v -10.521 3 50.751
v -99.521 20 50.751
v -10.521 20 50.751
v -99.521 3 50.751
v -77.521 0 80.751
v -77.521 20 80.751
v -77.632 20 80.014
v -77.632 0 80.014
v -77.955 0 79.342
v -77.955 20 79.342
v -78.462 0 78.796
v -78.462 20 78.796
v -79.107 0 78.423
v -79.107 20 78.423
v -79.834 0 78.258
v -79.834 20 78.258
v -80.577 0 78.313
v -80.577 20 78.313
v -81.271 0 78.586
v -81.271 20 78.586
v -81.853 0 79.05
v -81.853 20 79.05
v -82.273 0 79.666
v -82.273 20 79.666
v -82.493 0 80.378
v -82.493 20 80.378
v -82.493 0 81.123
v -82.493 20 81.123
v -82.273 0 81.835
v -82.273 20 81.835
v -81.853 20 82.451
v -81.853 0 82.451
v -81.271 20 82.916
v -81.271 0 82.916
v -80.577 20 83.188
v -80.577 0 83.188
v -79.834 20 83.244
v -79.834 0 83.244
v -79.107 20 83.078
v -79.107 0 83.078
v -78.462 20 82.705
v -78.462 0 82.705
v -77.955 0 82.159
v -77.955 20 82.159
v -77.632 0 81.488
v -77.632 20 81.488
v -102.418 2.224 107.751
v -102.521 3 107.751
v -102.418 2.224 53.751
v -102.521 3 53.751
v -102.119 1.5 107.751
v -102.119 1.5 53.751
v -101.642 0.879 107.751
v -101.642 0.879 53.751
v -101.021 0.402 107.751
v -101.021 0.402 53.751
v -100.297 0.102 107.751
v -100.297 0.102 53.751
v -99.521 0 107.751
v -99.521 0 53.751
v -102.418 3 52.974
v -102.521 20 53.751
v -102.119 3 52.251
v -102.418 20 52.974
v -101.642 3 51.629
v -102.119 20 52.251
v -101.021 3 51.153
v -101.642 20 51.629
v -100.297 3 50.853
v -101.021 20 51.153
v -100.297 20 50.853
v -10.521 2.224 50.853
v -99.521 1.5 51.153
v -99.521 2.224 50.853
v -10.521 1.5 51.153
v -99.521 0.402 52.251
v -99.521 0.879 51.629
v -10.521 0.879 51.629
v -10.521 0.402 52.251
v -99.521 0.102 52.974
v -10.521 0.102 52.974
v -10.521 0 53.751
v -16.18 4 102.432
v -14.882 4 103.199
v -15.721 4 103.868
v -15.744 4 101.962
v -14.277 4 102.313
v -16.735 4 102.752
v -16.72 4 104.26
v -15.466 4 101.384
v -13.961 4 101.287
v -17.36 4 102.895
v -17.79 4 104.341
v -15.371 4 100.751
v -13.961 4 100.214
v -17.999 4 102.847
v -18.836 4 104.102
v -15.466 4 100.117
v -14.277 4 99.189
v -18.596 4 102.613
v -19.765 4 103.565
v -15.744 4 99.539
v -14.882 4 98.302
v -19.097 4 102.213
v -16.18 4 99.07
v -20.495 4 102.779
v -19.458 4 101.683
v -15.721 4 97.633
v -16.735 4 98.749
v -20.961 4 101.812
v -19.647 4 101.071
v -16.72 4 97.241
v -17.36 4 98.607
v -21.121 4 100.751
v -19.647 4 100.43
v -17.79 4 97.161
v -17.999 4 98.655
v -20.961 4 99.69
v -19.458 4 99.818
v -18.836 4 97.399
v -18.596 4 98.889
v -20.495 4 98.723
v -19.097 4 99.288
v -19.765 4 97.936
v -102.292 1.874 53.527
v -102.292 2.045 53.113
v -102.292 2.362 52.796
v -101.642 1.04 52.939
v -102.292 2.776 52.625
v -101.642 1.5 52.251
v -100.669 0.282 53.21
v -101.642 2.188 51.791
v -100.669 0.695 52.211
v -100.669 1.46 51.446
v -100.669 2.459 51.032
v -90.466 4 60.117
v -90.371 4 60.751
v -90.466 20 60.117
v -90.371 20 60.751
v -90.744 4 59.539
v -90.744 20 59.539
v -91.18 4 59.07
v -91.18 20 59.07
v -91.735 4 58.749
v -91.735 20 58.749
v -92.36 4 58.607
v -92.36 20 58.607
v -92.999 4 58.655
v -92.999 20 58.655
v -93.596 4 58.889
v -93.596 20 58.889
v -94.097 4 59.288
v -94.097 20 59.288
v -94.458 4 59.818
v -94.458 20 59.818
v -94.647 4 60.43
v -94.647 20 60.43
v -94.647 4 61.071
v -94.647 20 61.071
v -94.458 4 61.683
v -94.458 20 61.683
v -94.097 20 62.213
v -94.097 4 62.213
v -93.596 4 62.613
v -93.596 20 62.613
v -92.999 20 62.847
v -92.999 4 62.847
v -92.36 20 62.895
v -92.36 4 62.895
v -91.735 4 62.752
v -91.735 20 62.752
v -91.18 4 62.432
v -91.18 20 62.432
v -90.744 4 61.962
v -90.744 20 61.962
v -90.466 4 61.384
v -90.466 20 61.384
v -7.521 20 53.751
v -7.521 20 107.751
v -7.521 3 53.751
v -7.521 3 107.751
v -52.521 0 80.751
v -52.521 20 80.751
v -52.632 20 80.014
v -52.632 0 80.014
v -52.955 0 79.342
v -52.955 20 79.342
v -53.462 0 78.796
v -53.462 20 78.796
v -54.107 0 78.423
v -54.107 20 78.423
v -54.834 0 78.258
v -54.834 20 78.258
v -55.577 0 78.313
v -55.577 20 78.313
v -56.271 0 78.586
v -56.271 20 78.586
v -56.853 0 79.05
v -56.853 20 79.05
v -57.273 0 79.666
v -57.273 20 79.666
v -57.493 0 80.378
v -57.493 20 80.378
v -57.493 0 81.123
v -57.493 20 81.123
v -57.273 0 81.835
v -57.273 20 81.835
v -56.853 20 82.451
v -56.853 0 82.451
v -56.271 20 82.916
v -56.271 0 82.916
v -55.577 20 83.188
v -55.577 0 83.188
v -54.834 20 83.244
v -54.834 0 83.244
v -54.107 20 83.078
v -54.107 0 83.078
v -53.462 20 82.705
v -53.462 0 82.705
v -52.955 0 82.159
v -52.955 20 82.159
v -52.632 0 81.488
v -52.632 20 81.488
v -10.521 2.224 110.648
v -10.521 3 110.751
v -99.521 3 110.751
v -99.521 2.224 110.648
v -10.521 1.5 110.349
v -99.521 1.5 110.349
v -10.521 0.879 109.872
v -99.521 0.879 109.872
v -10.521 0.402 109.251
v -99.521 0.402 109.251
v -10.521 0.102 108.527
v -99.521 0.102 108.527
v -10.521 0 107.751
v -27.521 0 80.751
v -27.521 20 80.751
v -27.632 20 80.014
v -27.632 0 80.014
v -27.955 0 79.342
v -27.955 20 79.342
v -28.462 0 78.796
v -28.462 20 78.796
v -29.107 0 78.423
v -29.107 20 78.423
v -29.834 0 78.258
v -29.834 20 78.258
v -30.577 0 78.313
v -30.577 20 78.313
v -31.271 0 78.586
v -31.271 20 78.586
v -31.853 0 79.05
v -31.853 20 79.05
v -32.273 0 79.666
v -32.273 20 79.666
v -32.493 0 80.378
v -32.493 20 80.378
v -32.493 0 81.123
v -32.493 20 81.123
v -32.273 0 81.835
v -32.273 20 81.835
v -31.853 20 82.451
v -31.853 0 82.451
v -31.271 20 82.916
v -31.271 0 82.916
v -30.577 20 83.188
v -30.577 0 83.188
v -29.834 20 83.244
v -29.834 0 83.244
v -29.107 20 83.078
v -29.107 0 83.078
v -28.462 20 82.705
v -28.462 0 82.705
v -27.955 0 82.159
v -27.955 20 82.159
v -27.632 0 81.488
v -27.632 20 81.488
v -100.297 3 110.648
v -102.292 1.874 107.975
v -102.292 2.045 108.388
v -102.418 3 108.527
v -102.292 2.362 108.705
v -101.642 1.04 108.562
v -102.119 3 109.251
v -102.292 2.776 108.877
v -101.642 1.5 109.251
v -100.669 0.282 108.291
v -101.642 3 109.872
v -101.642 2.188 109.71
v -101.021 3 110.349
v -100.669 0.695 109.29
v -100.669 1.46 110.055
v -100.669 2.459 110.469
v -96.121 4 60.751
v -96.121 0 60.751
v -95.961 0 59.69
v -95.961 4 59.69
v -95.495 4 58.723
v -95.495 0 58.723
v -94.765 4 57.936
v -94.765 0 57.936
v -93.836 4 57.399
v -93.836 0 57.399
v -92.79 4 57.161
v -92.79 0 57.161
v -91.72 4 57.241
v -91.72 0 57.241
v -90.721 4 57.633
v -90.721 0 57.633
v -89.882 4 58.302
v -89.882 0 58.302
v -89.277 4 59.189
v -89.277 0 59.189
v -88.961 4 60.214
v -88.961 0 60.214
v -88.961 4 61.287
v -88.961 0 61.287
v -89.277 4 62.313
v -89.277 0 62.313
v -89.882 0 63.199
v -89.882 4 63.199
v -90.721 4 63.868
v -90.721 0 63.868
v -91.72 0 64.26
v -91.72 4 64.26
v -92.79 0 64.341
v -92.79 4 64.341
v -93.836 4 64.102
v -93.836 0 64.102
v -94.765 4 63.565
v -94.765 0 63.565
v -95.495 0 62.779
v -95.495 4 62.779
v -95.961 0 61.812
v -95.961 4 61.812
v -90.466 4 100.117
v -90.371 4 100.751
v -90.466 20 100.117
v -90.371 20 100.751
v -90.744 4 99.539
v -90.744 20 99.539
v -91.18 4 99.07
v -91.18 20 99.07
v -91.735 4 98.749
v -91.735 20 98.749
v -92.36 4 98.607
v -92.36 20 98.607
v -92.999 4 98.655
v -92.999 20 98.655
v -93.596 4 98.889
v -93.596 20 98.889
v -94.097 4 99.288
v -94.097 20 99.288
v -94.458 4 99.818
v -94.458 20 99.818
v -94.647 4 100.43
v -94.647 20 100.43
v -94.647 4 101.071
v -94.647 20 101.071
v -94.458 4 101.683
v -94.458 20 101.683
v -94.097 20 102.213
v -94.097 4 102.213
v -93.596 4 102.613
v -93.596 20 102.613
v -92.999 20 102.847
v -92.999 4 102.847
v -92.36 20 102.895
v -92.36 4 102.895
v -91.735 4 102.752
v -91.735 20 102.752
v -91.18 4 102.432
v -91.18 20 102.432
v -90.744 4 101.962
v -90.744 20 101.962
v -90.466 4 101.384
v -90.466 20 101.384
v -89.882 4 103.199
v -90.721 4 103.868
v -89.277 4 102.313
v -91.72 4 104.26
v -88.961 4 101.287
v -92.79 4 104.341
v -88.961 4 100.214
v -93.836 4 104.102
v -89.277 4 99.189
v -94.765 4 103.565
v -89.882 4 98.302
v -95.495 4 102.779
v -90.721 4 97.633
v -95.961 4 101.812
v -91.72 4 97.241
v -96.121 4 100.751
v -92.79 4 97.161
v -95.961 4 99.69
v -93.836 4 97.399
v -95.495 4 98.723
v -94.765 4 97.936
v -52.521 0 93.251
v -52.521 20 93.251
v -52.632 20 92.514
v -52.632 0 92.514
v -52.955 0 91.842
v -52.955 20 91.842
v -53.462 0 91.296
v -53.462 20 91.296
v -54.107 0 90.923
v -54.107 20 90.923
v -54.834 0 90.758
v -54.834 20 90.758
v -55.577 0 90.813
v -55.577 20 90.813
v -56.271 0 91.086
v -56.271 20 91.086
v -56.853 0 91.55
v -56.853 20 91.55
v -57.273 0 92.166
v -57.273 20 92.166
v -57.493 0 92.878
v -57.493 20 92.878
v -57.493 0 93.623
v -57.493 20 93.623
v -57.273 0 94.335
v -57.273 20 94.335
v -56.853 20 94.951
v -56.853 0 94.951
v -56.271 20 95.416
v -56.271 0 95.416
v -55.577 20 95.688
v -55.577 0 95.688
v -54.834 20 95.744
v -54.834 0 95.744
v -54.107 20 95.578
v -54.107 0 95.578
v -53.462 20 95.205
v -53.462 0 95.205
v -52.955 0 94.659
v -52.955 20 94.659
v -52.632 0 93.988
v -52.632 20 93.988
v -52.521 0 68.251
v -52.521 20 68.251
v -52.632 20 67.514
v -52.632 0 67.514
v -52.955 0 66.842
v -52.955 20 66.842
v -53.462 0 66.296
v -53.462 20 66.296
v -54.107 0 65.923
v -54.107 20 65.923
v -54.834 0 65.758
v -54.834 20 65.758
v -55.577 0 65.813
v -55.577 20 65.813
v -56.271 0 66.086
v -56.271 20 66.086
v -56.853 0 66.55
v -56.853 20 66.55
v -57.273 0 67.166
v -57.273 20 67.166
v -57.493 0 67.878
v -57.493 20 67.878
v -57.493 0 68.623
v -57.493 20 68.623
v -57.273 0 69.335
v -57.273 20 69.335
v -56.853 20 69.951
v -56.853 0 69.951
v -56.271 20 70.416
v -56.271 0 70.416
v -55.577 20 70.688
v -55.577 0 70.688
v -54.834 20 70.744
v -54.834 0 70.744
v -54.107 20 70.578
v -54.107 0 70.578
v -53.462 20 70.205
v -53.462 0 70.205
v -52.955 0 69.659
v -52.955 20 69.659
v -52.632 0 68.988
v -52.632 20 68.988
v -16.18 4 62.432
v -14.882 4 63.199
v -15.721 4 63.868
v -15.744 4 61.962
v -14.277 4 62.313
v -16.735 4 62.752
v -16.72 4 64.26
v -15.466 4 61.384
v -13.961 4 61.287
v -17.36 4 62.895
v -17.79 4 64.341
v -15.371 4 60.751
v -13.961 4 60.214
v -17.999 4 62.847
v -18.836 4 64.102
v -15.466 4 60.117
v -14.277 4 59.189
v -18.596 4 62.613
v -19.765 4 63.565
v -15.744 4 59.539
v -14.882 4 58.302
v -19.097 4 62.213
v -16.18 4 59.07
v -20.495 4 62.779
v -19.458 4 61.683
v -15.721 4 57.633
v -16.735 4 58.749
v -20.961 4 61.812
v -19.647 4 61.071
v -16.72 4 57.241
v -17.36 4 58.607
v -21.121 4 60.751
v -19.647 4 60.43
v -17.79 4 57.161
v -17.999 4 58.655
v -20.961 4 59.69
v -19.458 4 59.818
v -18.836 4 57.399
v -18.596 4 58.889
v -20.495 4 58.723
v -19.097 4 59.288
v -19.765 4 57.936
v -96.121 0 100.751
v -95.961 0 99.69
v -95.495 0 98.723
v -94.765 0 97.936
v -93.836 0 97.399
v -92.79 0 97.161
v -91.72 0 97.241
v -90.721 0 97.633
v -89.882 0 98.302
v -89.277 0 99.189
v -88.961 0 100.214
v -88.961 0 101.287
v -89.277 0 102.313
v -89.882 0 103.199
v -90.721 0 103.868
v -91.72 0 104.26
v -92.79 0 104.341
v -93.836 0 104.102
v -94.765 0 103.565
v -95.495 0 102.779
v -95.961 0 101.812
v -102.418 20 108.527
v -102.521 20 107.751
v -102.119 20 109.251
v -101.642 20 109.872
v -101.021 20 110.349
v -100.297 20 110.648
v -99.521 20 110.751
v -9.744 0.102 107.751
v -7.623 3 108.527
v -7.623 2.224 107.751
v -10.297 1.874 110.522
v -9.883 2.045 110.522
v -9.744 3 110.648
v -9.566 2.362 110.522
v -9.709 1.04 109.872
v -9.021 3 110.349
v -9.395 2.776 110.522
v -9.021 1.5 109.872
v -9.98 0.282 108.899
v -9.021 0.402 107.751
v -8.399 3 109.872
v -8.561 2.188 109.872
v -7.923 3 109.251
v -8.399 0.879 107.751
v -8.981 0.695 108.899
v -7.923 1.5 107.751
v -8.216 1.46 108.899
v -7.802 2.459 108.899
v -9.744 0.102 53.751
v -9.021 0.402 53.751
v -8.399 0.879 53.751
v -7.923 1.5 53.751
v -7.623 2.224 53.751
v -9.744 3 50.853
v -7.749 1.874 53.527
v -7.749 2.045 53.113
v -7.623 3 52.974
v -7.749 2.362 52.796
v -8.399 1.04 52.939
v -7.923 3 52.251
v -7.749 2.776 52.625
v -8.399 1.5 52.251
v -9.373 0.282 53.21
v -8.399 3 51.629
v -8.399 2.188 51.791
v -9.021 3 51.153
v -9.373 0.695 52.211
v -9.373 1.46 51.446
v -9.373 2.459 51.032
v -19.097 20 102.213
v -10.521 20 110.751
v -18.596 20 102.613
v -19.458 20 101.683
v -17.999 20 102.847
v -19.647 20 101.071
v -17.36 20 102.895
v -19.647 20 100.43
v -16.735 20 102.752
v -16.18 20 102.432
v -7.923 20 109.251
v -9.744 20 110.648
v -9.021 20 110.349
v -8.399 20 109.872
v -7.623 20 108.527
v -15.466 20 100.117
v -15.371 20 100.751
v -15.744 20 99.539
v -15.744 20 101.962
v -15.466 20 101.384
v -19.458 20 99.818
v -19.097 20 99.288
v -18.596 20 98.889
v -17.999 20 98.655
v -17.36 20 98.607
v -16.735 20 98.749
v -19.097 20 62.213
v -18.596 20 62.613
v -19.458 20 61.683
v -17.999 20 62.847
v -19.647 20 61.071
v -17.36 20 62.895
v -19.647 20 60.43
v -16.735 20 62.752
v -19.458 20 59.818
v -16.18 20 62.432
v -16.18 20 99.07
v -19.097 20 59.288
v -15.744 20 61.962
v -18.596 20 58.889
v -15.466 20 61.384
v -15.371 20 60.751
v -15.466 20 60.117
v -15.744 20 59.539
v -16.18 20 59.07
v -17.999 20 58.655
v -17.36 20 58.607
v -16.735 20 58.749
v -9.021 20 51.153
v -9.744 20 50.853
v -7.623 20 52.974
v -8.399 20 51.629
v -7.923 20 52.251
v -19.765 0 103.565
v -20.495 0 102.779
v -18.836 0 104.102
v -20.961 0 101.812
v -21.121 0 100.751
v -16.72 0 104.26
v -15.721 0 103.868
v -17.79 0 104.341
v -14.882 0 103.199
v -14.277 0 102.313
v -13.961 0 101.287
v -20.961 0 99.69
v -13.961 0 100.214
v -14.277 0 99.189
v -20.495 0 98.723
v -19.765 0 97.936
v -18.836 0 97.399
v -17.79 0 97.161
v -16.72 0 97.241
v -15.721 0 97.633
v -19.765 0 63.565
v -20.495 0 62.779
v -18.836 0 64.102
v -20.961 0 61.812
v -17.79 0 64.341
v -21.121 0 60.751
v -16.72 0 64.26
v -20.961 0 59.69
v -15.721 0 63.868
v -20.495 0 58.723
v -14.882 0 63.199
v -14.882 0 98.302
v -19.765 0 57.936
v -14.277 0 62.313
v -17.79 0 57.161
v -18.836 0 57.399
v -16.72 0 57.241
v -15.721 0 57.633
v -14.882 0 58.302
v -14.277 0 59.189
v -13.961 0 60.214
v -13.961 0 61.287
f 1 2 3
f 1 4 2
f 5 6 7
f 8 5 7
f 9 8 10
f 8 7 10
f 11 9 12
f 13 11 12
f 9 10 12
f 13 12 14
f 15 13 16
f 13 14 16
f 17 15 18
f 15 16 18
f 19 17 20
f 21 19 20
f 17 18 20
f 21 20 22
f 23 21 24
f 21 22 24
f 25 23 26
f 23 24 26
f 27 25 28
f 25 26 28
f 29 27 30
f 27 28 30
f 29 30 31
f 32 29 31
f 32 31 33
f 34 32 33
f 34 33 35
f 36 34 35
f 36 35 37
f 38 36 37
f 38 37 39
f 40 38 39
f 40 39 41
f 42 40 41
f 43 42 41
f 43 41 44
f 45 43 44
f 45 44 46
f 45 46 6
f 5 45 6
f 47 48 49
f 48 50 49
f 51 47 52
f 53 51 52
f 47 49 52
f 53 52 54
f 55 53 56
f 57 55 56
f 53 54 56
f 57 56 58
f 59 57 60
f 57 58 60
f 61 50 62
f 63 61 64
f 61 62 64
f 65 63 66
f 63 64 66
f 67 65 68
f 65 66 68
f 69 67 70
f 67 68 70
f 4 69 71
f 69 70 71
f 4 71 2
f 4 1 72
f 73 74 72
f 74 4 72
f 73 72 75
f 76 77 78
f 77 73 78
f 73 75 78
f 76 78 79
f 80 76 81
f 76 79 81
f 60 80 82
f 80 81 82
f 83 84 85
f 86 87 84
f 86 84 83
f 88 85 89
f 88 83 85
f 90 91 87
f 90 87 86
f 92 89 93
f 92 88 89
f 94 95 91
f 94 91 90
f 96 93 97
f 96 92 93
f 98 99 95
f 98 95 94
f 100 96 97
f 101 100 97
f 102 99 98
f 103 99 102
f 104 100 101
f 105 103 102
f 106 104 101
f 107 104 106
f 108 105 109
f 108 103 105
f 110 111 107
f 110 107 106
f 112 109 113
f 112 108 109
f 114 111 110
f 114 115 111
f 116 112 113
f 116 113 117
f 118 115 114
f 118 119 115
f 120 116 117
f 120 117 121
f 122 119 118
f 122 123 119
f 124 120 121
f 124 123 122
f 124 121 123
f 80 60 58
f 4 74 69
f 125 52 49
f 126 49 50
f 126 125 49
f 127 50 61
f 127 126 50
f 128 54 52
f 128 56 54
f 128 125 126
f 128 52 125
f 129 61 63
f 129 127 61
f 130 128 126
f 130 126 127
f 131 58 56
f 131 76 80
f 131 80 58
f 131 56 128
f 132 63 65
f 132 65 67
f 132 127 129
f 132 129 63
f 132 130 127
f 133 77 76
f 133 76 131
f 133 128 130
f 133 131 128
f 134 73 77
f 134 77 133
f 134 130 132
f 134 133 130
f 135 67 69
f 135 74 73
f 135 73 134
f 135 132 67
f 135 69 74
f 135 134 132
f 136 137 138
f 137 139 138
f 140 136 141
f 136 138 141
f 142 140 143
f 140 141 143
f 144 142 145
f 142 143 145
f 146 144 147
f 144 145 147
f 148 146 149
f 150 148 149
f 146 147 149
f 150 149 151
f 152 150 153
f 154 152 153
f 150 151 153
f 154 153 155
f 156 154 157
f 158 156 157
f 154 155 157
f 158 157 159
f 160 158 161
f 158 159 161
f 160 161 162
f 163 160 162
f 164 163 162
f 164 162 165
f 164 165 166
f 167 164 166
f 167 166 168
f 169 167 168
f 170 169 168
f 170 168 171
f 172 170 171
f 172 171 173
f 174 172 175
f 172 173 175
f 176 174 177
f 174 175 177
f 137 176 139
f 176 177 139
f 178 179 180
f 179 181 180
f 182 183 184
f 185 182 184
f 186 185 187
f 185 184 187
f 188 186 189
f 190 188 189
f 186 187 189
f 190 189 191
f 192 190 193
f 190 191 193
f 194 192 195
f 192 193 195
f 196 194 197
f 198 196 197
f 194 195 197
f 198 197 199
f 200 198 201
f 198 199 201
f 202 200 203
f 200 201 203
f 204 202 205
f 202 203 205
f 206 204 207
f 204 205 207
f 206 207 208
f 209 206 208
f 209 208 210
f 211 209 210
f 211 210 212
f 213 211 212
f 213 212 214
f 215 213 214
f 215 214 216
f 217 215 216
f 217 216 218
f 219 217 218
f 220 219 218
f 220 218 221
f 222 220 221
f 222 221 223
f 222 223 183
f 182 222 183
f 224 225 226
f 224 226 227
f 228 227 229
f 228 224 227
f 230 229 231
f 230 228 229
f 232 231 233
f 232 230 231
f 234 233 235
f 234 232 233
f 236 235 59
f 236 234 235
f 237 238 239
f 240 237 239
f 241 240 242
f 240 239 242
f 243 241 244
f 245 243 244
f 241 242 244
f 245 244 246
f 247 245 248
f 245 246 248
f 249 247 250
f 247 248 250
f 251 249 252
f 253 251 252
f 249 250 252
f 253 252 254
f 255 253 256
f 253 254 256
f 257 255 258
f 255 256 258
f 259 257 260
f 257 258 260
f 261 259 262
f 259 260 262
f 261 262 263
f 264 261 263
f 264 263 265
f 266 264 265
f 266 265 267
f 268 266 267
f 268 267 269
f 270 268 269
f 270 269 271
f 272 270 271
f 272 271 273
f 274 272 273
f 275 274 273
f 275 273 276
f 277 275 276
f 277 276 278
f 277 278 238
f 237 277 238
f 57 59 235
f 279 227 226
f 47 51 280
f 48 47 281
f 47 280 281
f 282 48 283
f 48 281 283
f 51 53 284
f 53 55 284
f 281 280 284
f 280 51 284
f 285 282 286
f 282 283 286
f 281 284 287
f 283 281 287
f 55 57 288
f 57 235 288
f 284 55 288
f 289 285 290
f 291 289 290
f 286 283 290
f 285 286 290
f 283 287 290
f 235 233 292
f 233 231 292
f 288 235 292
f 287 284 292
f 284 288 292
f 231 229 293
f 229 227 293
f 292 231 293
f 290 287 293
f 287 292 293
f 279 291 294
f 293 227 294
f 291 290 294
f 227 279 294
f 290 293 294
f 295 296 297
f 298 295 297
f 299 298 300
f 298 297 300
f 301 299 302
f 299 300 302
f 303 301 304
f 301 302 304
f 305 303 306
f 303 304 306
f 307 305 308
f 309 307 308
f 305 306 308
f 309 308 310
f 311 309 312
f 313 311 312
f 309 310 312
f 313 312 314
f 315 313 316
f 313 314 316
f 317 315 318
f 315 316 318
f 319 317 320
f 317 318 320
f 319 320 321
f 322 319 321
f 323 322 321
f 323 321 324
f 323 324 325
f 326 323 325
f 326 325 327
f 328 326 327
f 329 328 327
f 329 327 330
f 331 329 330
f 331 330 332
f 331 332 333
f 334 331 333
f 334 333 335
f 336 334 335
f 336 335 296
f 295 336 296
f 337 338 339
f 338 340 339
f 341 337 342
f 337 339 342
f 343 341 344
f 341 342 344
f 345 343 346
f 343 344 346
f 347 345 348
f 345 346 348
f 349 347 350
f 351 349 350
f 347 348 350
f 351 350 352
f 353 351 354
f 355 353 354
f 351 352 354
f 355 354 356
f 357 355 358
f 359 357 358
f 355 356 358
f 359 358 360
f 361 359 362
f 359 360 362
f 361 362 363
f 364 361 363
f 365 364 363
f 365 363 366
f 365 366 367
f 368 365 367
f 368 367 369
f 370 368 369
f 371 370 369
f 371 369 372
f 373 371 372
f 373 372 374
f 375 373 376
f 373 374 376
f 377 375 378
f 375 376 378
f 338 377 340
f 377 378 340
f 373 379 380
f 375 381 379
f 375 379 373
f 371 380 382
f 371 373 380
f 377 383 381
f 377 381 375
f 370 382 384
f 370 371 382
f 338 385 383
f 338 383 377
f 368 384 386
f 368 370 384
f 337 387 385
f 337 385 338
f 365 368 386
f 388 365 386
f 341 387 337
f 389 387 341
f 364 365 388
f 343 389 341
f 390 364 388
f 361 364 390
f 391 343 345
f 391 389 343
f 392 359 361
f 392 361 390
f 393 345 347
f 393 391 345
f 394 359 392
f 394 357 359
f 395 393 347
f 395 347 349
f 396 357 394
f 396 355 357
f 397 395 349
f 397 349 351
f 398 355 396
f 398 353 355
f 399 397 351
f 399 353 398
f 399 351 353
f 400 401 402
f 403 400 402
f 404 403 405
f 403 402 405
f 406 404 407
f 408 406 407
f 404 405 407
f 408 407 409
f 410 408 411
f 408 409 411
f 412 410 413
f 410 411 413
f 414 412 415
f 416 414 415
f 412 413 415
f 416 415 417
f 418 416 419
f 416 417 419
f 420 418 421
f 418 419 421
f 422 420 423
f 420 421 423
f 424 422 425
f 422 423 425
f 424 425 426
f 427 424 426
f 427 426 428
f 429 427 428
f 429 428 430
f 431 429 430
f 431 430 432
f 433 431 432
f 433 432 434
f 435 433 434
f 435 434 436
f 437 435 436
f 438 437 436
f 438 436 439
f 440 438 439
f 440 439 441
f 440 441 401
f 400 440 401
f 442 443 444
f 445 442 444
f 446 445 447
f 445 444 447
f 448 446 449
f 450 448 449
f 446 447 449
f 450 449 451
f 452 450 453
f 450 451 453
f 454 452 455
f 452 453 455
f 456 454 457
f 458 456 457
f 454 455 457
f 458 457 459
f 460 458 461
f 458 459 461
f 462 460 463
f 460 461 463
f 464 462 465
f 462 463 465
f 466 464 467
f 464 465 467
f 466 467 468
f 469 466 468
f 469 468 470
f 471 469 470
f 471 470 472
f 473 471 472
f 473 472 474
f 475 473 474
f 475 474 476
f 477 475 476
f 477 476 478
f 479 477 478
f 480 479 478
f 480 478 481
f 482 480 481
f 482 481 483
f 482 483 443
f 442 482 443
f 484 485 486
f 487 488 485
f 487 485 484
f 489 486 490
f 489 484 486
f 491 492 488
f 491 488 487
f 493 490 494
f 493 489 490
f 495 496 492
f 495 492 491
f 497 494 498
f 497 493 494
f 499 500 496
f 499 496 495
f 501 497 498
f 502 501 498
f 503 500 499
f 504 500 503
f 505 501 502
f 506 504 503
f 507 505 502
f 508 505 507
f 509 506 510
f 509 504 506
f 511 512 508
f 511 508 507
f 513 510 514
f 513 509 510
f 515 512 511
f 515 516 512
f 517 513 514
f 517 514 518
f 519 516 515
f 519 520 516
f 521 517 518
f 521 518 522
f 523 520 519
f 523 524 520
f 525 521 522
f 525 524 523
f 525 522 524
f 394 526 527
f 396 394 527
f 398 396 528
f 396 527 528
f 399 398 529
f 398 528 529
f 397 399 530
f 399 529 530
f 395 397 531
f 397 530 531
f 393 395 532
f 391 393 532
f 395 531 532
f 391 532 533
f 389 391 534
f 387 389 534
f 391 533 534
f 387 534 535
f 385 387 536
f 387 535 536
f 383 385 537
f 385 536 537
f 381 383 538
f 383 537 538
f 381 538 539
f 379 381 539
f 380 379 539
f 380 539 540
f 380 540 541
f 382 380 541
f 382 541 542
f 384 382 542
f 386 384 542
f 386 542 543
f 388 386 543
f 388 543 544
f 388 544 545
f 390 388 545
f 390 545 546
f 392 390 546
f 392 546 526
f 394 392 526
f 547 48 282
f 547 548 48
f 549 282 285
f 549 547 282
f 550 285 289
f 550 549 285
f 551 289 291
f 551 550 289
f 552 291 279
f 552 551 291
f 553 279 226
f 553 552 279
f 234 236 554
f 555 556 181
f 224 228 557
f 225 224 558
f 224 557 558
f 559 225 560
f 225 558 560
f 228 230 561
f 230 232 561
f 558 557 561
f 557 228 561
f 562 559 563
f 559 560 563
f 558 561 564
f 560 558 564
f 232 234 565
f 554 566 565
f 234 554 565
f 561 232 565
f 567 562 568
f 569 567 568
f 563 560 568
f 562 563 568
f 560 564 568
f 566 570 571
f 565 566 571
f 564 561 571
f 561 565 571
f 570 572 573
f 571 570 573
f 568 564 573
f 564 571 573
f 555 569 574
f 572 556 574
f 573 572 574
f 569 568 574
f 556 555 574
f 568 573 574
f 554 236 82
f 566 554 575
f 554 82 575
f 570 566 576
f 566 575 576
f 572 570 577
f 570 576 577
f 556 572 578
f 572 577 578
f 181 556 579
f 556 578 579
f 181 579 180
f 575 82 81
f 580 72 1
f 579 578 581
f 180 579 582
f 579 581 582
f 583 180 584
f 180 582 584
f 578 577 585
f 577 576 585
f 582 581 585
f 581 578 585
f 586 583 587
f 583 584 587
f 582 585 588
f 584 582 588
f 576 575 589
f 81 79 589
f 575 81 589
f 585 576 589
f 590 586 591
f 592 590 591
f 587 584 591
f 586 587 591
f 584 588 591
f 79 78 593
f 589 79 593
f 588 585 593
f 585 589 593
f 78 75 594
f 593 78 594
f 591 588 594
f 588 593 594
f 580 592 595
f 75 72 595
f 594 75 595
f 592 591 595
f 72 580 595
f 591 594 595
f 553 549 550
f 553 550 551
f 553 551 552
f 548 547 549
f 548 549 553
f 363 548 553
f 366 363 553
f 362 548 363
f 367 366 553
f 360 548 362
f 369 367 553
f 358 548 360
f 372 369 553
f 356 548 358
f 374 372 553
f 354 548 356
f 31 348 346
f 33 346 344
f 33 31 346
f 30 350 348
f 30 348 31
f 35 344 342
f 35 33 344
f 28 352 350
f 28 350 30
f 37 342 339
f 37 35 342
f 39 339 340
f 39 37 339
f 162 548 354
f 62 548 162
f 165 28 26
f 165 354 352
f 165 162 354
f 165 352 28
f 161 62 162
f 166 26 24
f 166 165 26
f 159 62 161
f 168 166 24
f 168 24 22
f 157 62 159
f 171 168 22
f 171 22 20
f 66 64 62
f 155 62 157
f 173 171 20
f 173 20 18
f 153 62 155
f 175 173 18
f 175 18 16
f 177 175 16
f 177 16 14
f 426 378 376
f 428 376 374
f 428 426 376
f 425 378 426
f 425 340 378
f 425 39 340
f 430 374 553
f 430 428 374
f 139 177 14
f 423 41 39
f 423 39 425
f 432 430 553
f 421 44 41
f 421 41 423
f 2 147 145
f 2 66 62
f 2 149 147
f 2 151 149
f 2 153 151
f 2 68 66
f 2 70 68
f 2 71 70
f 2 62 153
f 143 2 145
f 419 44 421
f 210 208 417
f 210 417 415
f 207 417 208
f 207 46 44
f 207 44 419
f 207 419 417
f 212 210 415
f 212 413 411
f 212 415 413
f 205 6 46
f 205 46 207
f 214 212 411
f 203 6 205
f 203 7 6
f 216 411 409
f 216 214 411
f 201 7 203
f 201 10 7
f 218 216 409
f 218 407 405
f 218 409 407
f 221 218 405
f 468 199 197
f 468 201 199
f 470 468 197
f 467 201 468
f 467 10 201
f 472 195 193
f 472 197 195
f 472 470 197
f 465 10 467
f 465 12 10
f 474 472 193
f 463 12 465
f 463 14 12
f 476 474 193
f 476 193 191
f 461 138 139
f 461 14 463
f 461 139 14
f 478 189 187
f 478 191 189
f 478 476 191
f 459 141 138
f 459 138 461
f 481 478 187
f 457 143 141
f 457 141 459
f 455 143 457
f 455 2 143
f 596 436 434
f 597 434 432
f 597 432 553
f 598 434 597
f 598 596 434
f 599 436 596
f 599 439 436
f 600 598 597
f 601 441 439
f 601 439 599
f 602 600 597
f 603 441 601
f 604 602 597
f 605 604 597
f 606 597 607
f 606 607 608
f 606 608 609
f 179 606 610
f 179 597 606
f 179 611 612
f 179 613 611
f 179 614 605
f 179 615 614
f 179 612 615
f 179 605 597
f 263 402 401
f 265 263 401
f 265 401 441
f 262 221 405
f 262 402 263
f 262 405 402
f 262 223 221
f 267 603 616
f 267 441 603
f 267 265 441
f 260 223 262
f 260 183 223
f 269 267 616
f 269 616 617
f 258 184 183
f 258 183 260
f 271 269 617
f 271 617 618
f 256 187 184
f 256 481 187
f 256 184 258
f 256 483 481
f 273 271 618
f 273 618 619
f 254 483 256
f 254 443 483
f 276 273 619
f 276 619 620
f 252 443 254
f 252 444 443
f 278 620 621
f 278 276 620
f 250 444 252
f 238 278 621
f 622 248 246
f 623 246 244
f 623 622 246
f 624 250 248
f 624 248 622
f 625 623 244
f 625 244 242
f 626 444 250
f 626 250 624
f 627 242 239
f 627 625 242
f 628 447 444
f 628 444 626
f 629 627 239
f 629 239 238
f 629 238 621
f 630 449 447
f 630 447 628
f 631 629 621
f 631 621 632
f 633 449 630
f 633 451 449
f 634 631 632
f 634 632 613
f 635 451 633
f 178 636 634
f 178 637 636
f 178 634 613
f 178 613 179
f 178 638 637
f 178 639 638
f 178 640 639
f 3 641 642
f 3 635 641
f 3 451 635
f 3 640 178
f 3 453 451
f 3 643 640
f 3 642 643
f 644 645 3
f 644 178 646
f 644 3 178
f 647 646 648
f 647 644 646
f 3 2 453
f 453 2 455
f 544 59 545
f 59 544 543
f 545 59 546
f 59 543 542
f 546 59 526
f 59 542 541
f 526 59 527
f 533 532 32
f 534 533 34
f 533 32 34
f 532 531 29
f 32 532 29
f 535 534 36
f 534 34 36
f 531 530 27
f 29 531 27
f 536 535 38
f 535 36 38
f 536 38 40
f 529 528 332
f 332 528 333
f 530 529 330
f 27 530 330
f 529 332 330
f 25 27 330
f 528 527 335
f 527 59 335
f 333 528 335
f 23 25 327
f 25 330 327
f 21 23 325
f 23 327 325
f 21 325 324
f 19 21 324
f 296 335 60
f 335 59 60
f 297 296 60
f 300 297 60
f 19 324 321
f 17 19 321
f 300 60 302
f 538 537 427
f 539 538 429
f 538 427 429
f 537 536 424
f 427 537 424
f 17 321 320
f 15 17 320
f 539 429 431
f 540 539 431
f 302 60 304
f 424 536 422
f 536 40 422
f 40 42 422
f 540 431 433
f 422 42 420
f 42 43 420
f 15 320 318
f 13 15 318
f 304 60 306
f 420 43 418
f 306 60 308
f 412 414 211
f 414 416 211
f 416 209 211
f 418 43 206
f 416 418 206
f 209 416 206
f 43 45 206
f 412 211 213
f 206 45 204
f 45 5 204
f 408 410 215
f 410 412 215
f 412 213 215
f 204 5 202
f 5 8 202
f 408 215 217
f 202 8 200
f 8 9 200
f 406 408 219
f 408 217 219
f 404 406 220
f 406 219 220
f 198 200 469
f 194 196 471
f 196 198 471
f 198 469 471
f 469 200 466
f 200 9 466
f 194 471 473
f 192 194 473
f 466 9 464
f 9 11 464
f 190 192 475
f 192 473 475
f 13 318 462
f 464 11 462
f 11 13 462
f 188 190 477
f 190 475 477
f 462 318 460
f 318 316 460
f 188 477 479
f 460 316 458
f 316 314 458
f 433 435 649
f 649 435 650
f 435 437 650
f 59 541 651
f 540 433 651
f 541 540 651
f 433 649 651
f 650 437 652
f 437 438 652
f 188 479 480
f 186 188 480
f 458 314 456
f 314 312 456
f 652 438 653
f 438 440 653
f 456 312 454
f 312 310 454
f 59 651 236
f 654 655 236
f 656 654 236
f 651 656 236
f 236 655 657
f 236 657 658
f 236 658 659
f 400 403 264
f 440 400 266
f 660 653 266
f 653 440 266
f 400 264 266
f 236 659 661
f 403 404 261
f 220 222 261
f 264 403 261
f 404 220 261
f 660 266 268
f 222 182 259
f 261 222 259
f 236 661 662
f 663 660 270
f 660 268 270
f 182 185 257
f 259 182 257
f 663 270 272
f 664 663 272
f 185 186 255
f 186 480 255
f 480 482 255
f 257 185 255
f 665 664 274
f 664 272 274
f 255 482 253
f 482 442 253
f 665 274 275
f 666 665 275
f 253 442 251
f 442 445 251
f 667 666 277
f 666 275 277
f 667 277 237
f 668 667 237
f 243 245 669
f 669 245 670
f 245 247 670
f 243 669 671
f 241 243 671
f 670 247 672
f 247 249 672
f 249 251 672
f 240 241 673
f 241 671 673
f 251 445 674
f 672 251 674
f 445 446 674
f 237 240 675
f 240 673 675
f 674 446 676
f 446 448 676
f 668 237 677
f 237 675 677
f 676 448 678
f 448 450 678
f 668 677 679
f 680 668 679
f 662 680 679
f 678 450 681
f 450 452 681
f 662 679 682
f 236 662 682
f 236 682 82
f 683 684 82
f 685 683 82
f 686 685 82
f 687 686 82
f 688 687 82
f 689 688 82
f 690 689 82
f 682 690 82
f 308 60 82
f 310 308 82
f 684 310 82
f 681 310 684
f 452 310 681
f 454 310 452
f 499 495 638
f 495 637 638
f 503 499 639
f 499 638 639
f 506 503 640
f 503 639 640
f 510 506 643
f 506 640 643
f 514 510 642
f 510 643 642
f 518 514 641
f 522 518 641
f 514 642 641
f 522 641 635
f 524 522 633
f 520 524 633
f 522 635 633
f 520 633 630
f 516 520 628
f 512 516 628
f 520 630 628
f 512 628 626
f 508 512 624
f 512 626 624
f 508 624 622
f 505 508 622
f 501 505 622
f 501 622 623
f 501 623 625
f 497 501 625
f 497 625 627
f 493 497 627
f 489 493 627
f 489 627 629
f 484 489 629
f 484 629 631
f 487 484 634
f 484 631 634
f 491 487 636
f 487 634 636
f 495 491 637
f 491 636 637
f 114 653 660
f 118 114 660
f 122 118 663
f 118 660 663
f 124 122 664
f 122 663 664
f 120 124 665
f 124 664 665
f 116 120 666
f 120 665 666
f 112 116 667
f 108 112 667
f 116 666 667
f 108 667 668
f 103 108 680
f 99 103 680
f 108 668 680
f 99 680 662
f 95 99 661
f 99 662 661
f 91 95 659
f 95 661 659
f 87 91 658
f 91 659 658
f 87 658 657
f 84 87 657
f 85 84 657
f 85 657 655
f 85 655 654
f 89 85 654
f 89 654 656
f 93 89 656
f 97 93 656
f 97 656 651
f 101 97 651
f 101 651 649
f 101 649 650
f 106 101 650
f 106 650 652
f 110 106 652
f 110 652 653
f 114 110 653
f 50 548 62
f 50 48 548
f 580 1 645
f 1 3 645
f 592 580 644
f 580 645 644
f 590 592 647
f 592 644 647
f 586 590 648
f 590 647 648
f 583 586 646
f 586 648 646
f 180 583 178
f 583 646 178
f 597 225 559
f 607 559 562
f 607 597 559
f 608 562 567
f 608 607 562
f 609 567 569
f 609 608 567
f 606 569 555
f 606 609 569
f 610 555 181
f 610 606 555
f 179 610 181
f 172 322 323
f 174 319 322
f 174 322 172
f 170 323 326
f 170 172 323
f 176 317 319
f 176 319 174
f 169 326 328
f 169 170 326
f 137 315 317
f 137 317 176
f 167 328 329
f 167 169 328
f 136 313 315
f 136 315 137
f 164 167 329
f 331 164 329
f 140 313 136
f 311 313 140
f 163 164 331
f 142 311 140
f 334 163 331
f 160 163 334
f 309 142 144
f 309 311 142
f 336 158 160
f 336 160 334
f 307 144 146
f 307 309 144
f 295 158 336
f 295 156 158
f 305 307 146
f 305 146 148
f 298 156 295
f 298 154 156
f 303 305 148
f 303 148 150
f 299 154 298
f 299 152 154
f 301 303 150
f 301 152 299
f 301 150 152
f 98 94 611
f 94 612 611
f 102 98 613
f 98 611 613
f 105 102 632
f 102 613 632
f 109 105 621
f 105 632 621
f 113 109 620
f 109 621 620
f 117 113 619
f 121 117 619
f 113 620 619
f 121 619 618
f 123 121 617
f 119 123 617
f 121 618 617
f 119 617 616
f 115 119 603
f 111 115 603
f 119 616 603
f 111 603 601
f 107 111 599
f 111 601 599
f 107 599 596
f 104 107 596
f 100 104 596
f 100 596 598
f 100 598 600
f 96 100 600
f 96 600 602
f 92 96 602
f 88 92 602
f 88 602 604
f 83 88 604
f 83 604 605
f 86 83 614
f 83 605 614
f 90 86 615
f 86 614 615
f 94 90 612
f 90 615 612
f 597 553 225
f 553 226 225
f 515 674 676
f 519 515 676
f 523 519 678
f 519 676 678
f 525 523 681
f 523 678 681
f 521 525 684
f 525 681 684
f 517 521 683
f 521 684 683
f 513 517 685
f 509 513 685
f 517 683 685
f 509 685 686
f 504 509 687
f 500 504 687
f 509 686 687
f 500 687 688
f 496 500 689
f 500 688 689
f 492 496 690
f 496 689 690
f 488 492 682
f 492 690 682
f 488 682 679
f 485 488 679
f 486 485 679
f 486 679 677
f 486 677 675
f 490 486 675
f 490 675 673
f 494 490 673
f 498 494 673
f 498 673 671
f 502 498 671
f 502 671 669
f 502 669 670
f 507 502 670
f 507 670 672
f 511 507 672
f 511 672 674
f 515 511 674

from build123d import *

# Parameters (mm, degrees)
SKETCH1_W                                   = 95
SKETCH1_H                                   = 60
BOSS_EXTRUDE1_DEPTH                         = 20
CBORE_FOR_M4_CHEESE_HEAD_SCREW1_D           = 4.3
CBORE_FOR_M4_CHEESE_HEAD_SCREW1_CBORE_D     = 7.2
CBORE_FOR_M4_CHEESE_HEAD_SCREW1_CBORE_DEPTH = 4
F_5_0MM_DOWEL_HOLE1_D                       = 5
FILLET1_R                                   = 3


with BuildPart() as part:
    # Sketch1 → Boss-Extrude1 (new body)
    with BuildSketch(Plane(origin=(0, 0, 0), x_dir=(1, 0, 0), z_dir=(0, 1, 0))):
        with Locations((-55.020594587, -80.750619844)):
            Rectangle(SKETCH1_W, SKETCH1_H)
    extrude(amount=BOSS_EXTRUDE1_DEPTH)

    # CBORE for M4 Cheese Head Screw1 (through all)
    with Locations(Plane(origin=(0, 0, 0), x_dir=(-1, 0, 0), z_dir=(0, -1, 0))):
        with Locations((17.520594587, -60.750619844), (92.520594587, -60.750619844), (92.520594587, -100.750619844), (17.520594587, -100.750619844)):
            CounterBoreHole(CBORE_FOR_M4_CHEESE_HEAD_SCREW1_D / 2, CBORE_FOR_M4_CHEESE_HEAD_SCREW1_CBORE_D / 2, CBORE_FOR_M4_CHEESE_HEAD_SCREW1_CBORE_DEPTH)

    # Ø5.0mm Dowel Hole1 (through all)
    with Locations(Plane(origin=(0, 0, 0), x_dir=(-1, 0, 0), z_dir=(0, -1, 0))):
        with Locations((30.020594587, -80.750619844), (55.020594587, -80.750619844), (80.020594587, -80.750619844), (55.020594587, -68.250619844), (55.020594587, -93.250619844)):
            Hole(F_5_0MM_DOWEL_HOLE1_D / 2)

    # Fillet1
    fillet1_edges = [part.edges().sort_by_distance(p)[0] for p in [
        (-55.020594587, 0, 50.750619844),
        (-7.520594587, 0, 80.750619844),
        (-55.020594587, 0, 110.750619844),
        (-102.520594587, 0, 80.750619844),
        (-102.520594587, 10, 50.750619844),
        (-7.520594587, 10, 50.750619844),
        (-7.520594587, 10, 110.750619844),
        (-102.520594587, 10, 110.750619844),
    ]]
    fillet(fillet1_edges, radius=FILLET1_R)


solid = part.part
